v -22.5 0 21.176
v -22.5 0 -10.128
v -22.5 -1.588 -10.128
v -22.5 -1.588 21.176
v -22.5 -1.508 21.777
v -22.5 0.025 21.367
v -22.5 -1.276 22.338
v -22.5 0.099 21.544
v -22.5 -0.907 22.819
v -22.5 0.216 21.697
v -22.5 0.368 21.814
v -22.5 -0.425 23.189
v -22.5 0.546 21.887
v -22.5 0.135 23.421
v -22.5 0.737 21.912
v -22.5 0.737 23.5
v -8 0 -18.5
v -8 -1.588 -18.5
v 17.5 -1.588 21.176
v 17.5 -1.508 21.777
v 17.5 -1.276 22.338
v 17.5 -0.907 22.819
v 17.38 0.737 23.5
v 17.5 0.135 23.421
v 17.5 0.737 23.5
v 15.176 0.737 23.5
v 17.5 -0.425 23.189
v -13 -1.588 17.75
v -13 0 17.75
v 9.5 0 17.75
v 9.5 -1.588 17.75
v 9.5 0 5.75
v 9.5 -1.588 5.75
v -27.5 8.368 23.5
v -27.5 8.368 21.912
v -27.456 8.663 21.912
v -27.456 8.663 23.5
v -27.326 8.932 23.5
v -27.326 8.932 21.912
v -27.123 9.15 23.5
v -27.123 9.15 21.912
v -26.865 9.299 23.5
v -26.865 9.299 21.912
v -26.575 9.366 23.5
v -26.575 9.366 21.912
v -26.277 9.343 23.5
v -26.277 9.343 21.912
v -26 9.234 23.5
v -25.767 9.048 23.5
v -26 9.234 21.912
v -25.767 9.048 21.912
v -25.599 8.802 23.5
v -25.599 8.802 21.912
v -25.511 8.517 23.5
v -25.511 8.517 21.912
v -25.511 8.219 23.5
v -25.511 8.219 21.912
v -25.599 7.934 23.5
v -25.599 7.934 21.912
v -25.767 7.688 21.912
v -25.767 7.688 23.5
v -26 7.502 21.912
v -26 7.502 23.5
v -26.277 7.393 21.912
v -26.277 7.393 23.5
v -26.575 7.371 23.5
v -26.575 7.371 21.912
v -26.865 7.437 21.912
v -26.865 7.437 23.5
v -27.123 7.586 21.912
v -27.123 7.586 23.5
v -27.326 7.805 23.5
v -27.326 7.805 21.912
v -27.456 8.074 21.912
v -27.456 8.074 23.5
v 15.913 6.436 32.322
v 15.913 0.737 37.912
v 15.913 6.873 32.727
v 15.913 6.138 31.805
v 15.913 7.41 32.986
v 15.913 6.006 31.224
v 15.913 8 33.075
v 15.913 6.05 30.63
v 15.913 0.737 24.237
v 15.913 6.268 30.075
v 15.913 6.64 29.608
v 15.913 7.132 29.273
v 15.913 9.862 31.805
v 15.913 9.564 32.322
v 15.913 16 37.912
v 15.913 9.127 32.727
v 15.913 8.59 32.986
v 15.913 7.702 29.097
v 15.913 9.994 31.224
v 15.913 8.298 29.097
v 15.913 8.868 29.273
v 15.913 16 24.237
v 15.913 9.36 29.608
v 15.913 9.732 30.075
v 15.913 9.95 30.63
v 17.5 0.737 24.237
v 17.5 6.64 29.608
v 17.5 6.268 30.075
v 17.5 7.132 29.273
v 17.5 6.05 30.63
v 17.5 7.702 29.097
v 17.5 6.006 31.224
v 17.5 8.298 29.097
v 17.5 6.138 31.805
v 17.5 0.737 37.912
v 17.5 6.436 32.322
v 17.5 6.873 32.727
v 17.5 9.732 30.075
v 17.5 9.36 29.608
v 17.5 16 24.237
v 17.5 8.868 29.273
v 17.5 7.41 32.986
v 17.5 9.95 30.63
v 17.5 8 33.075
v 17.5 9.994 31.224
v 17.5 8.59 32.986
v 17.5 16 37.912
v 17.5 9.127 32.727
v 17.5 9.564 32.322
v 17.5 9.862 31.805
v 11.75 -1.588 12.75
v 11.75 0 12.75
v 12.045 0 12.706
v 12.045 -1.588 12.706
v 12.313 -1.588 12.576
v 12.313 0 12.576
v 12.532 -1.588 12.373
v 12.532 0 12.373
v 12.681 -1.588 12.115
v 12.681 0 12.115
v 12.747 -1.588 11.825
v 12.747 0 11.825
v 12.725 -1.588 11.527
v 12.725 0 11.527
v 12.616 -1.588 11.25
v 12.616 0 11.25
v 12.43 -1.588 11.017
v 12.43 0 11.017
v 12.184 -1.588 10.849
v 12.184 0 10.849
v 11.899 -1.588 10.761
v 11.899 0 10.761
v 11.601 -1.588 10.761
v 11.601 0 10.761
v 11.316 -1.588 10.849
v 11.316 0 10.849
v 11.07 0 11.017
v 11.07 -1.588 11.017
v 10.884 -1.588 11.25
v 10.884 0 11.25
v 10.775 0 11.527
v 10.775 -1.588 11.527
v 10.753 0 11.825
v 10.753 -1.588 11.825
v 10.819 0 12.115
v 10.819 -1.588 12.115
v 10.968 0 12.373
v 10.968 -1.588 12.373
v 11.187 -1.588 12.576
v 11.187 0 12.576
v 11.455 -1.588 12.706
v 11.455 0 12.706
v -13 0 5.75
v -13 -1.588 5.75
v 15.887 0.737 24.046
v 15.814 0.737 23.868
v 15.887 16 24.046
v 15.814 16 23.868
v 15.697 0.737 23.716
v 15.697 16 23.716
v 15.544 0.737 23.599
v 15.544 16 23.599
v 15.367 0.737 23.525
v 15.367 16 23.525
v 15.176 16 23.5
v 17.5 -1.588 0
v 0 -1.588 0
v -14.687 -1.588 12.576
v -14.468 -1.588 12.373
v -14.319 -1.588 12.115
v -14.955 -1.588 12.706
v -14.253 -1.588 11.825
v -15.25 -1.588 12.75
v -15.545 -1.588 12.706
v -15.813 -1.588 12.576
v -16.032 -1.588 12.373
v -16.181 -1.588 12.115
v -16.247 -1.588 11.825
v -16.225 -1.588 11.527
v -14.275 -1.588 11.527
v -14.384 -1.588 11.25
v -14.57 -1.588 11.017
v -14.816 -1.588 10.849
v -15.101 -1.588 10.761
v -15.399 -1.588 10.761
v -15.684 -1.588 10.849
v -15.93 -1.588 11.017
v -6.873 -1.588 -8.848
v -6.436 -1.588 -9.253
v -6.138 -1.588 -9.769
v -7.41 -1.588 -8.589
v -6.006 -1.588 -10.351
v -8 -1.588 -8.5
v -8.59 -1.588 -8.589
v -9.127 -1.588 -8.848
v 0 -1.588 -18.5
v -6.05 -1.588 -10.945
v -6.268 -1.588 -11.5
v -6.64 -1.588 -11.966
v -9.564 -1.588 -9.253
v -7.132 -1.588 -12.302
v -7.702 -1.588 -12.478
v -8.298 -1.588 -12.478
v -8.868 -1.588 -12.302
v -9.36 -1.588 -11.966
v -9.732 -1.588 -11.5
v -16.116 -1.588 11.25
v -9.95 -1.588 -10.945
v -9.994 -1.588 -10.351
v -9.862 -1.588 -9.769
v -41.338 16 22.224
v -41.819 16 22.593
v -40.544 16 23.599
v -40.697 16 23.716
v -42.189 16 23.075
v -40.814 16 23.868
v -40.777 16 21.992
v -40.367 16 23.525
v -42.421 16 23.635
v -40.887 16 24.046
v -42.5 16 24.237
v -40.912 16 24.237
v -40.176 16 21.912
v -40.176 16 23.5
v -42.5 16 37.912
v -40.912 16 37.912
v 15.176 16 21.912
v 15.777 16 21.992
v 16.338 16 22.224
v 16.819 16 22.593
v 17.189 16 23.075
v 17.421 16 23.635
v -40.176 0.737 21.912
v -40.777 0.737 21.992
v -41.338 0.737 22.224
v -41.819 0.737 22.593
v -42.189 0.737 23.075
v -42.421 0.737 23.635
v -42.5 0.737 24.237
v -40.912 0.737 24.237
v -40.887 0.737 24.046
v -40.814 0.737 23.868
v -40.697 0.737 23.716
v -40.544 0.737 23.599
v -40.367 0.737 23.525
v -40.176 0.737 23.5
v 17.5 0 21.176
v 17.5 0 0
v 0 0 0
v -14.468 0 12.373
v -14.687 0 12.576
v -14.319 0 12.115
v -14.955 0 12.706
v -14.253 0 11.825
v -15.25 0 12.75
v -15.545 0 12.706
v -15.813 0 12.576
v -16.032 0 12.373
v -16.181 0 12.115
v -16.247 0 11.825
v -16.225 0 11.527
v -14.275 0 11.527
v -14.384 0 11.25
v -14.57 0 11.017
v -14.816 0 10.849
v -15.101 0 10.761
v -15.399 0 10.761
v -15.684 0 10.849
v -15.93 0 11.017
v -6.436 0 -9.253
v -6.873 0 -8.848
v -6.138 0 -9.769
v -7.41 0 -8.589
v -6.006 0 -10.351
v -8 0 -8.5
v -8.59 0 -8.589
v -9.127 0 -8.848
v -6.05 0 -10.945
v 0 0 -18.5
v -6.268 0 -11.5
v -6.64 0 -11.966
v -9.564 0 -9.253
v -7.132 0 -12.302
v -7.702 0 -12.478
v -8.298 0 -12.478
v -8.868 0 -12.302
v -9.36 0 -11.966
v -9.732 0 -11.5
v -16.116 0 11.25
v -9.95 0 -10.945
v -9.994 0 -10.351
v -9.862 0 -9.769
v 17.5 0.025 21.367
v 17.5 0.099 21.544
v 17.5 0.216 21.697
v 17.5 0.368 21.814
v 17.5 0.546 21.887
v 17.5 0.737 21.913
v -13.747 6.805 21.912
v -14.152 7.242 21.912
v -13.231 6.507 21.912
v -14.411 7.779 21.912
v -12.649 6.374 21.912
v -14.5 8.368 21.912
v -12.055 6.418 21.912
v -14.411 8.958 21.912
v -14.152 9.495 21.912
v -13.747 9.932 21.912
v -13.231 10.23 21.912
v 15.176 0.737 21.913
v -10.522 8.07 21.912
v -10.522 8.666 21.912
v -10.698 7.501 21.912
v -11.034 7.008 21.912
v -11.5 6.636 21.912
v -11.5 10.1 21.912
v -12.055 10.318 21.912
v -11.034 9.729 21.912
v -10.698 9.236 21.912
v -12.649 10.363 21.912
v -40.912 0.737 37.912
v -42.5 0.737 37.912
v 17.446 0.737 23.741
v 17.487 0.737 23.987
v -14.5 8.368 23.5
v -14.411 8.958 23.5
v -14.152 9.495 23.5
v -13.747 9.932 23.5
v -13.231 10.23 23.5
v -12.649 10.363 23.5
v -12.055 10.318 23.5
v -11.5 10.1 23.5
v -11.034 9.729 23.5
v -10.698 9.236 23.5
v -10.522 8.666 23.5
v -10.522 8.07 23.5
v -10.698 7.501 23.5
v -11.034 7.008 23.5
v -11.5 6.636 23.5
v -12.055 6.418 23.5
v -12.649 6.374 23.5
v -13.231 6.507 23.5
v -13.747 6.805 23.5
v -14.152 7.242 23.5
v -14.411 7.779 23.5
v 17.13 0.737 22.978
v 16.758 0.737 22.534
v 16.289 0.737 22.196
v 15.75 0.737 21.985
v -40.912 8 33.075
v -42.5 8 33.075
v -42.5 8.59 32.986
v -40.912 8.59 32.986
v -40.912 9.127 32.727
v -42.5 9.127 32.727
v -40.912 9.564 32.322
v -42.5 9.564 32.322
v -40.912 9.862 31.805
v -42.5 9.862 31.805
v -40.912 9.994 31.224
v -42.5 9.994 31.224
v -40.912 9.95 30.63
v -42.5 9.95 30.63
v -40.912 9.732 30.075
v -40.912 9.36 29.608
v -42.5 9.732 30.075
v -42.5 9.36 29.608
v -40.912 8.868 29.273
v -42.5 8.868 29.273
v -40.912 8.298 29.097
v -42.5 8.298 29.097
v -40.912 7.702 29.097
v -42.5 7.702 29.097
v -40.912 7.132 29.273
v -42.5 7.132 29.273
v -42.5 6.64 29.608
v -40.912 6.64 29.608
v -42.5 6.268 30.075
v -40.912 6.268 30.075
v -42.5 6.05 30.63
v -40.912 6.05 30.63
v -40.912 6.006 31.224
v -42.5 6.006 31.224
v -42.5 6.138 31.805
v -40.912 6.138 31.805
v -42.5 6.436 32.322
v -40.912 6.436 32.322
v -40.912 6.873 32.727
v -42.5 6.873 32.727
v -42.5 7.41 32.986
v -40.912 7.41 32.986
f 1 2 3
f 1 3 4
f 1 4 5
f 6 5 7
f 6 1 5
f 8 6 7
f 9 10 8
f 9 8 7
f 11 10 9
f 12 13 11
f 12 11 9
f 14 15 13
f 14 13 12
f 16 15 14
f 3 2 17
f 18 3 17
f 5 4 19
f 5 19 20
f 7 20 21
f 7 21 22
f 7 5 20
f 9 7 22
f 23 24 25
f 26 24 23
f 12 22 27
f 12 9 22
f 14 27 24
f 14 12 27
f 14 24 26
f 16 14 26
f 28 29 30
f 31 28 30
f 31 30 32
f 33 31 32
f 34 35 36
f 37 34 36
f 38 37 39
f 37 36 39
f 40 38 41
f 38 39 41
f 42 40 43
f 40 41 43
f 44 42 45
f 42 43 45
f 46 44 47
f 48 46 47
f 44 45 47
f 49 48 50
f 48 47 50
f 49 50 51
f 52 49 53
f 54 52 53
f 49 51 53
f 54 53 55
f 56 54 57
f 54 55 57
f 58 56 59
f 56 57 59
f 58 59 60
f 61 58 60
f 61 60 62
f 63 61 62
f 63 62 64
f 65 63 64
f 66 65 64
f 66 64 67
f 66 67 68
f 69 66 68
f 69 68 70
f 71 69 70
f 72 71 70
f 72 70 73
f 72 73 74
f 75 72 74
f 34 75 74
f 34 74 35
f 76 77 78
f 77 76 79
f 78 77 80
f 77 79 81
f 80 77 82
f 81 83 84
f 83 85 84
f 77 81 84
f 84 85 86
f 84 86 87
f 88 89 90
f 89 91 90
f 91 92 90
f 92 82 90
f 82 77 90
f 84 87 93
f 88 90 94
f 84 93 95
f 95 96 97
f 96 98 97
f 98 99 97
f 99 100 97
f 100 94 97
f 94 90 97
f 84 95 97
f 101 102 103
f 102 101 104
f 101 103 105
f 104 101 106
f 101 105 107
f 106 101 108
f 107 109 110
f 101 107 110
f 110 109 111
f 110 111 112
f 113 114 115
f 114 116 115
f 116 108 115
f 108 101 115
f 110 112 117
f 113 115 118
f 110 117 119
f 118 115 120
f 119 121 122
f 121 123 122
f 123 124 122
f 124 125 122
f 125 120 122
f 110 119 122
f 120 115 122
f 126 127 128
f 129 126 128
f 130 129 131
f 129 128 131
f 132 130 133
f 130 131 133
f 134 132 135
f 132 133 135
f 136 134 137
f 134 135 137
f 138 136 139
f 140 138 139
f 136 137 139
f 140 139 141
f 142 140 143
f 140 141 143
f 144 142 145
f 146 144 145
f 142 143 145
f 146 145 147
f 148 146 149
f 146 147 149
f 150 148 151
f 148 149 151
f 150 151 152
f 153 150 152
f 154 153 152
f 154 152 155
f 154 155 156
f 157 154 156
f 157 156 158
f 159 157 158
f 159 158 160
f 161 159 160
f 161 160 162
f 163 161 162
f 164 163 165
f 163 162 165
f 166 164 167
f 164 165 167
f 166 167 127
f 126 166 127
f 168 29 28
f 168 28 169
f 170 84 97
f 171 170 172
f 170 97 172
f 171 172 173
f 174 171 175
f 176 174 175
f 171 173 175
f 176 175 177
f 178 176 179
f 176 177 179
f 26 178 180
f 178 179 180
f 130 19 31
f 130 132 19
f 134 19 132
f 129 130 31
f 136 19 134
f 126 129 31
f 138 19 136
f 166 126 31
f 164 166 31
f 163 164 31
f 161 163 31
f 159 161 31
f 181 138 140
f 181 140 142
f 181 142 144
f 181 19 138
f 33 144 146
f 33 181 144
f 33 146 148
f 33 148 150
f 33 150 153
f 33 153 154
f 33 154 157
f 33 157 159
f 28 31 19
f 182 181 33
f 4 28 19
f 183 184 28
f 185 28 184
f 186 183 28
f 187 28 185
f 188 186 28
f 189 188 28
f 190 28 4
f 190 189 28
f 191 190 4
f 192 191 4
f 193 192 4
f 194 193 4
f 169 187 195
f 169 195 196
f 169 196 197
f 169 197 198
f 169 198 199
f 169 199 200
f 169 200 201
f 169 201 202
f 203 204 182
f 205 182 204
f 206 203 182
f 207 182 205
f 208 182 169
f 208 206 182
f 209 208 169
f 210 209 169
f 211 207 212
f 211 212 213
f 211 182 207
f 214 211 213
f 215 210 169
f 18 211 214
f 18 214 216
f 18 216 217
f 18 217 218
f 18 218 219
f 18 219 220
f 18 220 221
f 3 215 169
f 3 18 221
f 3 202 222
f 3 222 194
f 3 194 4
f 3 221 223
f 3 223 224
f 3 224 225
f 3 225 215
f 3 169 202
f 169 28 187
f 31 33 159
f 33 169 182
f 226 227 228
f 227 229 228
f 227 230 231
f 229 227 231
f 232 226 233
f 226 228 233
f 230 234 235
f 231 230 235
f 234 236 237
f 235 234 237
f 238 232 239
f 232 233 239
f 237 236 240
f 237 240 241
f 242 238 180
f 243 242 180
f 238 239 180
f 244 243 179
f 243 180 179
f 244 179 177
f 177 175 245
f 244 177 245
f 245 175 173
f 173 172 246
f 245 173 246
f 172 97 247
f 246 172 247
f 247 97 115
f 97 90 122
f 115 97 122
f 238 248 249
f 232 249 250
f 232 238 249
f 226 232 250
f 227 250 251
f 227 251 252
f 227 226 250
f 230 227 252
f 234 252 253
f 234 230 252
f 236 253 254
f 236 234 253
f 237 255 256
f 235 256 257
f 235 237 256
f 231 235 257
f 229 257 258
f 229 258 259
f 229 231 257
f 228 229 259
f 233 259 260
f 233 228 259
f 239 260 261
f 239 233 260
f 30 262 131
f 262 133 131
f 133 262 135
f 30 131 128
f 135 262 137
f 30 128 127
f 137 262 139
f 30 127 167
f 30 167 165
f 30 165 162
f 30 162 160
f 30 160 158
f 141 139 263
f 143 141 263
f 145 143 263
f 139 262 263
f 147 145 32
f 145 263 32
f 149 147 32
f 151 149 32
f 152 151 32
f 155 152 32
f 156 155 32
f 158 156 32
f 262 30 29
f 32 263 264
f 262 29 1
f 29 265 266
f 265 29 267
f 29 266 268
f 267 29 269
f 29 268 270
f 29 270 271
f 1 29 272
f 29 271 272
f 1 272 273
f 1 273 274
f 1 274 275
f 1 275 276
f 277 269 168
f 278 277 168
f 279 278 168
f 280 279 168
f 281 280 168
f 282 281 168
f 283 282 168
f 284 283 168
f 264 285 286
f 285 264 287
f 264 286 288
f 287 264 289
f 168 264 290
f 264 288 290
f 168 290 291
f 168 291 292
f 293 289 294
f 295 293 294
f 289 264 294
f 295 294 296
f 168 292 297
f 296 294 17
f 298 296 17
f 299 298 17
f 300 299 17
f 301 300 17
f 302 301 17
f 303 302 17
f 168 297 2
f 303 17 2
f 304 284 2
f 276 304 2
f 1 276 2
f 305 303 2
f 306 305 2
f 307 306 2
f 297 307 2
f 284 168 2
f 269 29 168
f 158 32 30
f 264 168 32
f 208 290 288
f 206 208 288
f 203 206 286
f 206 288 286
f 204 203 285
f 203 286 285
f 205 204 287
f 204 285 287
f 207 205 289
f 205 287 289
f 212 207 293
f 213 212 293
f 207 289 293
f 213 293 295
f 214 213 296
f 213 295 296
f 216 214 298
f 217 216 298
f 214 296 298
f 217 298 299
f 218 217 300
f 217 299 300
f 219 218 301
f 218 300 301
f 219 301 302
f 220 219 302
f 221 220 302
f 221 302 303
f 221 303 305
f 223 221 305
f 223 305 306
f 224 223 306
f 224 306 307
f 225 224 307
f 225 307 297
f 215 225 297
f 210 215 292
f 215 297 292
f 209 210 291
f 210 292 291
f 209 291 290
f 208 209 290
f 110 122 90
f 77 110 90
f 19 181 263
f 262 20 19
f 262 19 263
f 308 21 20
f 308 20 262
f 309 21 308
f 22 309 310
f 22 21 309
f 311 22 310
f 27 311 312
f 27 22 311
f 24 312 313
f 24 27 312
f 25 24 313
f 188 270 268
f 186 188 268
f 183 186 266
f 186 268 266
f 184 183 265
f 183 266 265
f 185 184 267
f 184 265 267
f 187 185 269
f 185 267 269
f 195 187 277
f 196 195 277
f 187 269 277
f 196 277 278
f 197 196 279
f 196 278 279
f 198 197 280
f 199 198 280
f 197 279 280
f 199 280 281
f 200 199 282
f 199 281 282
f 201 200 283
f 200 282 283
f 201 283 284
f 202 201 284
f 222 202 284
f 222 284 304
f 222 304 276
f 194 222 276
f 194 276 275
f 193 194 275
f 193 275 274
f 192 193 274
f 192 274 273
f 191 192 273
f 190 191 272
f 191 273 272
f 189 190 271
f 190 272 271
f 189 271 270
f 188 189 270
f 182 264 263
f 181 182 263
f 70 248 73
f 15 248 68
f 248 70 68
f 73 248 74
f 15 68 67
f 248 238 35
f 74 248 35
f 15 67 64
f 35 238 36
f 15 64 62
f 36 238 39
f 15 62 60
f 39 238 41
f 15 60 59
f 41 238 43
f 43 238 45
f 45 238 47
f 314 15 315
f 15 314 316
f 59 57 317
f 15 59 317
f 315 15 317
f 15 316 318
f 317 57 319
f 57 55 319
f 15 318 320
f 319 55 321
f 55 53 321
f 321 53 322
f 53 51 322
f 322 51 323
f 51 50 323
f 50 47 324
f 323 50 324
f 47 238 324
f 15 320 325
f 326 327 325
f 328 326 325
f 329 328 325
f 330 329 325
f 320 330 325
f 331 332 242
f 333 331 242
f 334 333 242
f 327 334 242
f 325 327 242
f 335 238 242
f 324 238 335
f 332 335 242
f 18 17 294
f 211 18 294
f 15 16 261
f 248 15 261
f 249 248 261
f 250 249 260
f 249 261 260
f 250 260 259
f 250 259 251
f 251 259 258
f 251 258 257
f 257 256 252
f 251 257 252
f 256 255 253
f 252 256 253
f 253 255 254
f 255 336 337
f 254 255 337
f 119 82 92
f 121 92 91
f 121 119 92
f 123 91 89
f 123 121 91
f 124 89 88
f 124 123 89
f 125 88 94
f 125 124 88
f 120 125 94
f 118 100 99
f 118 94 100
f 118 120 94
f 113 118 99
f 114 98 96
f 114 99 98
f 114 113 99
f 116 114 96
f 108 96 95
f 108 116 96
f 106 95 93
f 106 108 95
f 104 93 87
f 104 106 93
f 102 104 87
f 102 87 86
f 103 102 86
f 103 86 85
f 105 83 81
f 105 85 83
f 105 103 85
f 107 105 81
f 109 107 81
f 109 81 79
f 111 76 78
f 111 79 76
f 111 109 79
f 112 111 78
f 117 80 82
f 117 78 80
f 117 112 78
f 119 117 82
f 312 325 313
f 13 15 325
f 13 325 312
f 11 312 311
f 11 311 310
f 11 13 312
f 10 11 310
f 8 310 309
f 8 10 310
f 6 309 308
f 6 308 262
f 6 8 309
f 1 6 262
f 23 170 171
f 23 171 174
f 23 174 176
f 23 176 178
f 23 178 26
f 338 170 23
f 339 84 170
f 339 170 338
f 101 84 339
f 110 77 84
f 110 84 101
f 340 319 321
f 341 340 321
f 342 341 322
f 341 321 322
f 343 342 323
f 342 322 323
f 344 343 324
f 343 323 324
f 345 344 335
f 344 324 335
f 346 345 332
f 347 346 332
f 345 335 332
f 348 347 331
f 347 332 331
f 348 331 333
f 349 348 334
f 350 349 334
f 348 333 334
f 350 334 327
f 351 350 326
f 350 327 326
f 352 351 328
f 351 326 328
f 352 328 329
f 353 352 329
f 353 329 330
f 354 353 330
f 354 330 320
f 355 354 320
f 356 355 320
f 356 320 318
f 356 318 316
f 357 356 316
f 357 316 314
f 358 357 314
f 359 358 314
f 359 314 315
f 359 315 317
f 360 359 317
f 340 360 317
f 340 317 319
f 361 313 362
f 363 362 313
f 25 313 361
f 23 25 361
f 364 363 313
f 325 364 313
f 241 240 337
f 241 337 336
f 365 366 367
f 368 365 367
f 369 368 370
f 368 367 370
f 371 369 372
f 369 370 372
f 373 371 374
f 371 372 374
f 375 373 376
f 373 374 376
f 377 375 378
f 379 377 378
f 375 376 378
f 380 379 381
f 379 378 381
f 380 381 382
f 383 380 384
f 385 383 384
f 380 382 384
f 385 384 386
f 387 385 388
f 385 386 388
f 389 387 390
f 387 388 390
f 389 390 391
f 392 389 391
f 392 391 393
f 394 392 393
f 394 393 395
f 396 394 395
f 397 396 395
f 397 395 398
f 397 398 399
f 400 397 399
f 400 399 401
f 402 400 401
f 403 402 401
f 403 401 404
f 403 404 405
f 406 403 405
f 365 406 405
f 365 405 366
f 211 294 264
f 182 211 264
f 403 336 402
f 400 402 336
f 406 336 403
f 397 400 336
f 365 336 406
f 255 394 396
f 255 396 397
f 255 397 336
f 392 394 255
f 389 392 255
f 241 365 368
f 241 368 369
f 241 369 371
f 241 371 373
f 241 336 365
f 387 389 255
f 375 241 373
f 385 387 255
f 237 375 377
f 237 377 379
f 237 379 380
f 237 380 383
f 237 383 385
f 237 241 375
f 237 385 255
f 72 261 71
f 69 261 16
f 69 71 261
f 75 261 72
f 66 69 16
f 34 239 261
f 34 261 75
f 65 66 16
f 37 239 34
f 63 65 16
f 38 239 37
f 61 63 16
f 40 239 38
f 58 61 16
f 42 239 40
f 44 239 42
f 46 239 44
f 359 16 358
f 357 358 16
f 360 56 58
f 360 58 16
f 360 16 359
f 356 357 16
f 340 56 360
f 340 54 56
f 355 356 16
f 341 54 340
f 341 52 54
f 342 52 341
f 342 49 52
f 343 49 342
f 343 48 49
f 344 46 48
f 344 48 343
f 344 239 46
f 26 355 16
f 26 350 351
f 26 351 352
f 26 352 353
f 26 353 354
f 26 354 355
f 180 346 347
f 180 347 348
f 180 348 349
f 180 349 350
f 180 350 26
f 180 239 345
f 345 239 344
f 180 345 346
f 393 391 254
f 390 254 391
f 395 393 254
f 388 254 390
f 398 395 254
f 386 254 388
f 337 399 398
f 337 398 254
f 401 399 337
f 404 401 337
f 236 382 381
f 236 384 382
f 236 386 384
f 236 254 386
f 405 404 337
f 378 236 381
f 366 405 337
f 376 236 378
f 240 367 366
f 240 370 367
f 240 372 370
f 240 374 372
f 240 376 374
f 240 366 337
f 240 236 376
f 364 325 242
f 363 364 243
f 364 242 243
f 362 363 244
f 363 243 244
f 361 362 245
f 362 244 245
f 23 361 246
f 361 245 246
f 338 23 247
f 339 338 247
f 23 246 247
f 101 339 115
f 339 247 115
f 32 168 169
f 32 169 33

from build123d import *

# Parameters (mm, degrees)
SKETCH1_R                    = 2
SKETCH1_R_2                  = 1
SKETCH1_W                    = 22.5
SKETCH1_H                    = 12
BASE_FLANGE1_DEPTH           = 1.5875
EDGE_FLANGE1_STRIP_W         = 7.8232
EDGE_FLANGE1_STRIP_H         = 1.5875
EDGE_FLANGE1_STRIP_CUT_DEPTH = 40
EDGE_FLANGE1_DEPTH           = 40
EDGE_FLANGE1_PROFILE_W       = 60
EDGE_FLANGE1_PROFILE_H       = 15.2634
EDGE_FLANGE1_FLAT_DEPTH      = 1.5875
SKETCH11_R                   = 2
SKETCH11_R_2                 = 1
CUT_EXTRUDE1_DEPTH           = 61.789967563
EDGE_FLANGE2_STRIP_W         = 7.8232
EDGE_FLANGE2_STRIP_H         = 1.5875
EDGE_FLANGE2_STRIP_CUT_DEPTH = 15.2634
EDGE_FLANGE2_DEPTH           = 15.2634
SKETCH15_R                   = 2
CUT_EXTRUDE2_DEPTH           = 73.755464786


# Sheet-metal steps are written as plain solids
with BuildPart() as part:
    # Sketch1 → Base-Flange1 (new body)
    with BuildSketch(Plane(origin=(0, 0, 0), x_dir=(1, 0, 0), z_dir=(0, 1, 0))):
        Polygon((0, 0), (17.5, 0), (17.5, -23.5), (-22.5, -23.5), (-22.5, 10.128421097), (-8, 18.5), (0, 18.5), align=None)
        with Locations(Location((-8, 10.5, 0), (0, 0, 270))):
            Circle(SKETCH1_R, mode=Mode.SUBTRACT)
        with Locations(Location((11.75, -11.75, 0), (0, 0, 270))):
            Circle(SKETCH1_R_2, mode=Mode.SUBTRACT)
        with Locations(Location((-15.25, -11.75, 0), (0, 0, 270))):
            Circle(SKETCH1_R_2, mode=Mode.SUBTRACT)
        with Locations((-1.75, -11.75)):
            Rectangle(SKETCH1_W, SKETCH1_H, mode=Mode.SUBTRACT)
    extrude(amount=-BASE_FLANGE1_DEPTH)

    # Edge-Flange1 strip (across the edge) → Edge-Flange1 strip cut (cut)
    with BuildSketch(Plane(origin=(-22.5, 0, 23.5), x_dir=(0, 0, -1), z_dir=(1, 0, 0))):
        with Locations((-1.5875, -0.79375)):
            Rectangle(EDGE_FLANGE1_STRIP_W, EDGE_FLANGE1_STRIP_H)
    extrude(amount=EDGE_FLANGE1_STRIP_CUT_DEPTH, mode=Mode.SUBTRACT)

    # Edge-Flange1 bend section (across the edge) → Edge-Flange1 (add)
    with BuildSketch(Plane(origin=(-22.5, 0, 23.5), x_dir=(0, 0, -1), z_dir=(1, 0, 0))):
        with BuildLine():
            Line((0, 0.7366), (1.5875, 0.7366))
            ThreePointArc((1.5875, 0.7366), (1.803245145, 0.215745145), (2.3241, 0))
            Line((2.3241, 0), (2.3241, -1.5875))
            ThreePointArc((2.3241, -1.5875), (0.68071313, -0.90678687), (0, 0.7366))
        make_face()
    extrude(amount=EDGE_FLANGE1_DEPTH)

    # Edge-Flange1 profile (on flange) → Edge-Flange1 flat (add)
    with BuildSketch(Plane.XY.offset(23.5)):
        with Locations((-12.5, 8.3683)):
            Rectangle(EDGE_FLANGE1_PROFILE_W, EDGE_FLANGE1_PROFILE_H)
    extrude(amount=-EDGE_FLANGE1_FLAT_DEPTH)

    # Sketch11 → Cut-Extrude1 (cut, through all)
    with BuildSketch(Plane(origin=(0, 0, 21.9125), x_dir=(-1, 0, 0), z_dir=(0, 0, -1))):
        with Locations((12.5, 8.3683)):
            Circle(SKETCH11_R)
        with Locations((26.5, 8.3683)):
            Circle(SKETCH11_R_2)
    extrude(amount=-CUT_EXTRUDE1_DEPTH, mode=Mode.SUBTRACT)

    # Edge-Flange2 strip (across the edge) → Edge-Flange2 strip cut (cut)
    with BuildSketch(Plane(origin=(-42.5, 16, 23.5), x_dir=(1, 0, 0), z_dir=(0, -1, 0))):
        with Locations((-1.5875, -0.79375)):
            Rectangle(EDGE_FLANGE2_STRIP_W, EDGE_FLANGE2_STRIP_H)
    edge_flange2_strip_cut = extrude(amount=EDGE_FLANGE2_STRIP_CUT_DEPTH, mode=Mode.SUBTRACT)

    # Edge-Flange2 section (across the edge) → Edge-Flange2 (add)
    with BuildSketch(Plane(origin=(-42.5, 16, 23.5), x_dir=(1, 0, 0), z_dir=(0, -1, 0))):
        with BuildLine():
            Line((0, 0.7366), (0, 14.4125))
            Line((0, 14.4125), (1.5875, 14.4125))
            Line((1.5875, 14.4125), (1.5875, 0.7366))
            ThreePointArc((1.5875, 0.7366), (1.803245145, 0.215745145), (2.3241, 0))
            Line((2.3241, 0), (2.3241, -1.5875))
            ThreePointArc((2.3241, -1.5875), (0.68071313, -0.90678687), (0, 0.7366))
        make_face()
    edge_flange2 = extrude(amount=EDGE_FLANGE2_DEPTH)

    # Sketch15 → Cut-Extrude2 (cut, through all)
    with BuildSketch(Plane.ZY.offset(42.5)):
        with Locations((31.07455, 8)):
            Circle(SKETCH15_R)
    cut_extrude2 = extrude(amount=-CUT_EXTRUDE2_DEPTH, mode=Mode.SUBTRACT)

    # Mirror1: Edge-Flange2 strip cut, Edge-Flange2, Cut-Extrude2 across plane
    add(edge_flange2_strip_cut.mirror(Plane.ZY.offset(12.5)), mode=Mode.SUBTRACT)
    add(edge_flange2.mirror(Plane.ZY.offset(12.5)))
    add(cut_extrude2.mirror(Plane.ZY.offset(12.5)), mode=Mode.SUBTRACT)


solid = part.part
